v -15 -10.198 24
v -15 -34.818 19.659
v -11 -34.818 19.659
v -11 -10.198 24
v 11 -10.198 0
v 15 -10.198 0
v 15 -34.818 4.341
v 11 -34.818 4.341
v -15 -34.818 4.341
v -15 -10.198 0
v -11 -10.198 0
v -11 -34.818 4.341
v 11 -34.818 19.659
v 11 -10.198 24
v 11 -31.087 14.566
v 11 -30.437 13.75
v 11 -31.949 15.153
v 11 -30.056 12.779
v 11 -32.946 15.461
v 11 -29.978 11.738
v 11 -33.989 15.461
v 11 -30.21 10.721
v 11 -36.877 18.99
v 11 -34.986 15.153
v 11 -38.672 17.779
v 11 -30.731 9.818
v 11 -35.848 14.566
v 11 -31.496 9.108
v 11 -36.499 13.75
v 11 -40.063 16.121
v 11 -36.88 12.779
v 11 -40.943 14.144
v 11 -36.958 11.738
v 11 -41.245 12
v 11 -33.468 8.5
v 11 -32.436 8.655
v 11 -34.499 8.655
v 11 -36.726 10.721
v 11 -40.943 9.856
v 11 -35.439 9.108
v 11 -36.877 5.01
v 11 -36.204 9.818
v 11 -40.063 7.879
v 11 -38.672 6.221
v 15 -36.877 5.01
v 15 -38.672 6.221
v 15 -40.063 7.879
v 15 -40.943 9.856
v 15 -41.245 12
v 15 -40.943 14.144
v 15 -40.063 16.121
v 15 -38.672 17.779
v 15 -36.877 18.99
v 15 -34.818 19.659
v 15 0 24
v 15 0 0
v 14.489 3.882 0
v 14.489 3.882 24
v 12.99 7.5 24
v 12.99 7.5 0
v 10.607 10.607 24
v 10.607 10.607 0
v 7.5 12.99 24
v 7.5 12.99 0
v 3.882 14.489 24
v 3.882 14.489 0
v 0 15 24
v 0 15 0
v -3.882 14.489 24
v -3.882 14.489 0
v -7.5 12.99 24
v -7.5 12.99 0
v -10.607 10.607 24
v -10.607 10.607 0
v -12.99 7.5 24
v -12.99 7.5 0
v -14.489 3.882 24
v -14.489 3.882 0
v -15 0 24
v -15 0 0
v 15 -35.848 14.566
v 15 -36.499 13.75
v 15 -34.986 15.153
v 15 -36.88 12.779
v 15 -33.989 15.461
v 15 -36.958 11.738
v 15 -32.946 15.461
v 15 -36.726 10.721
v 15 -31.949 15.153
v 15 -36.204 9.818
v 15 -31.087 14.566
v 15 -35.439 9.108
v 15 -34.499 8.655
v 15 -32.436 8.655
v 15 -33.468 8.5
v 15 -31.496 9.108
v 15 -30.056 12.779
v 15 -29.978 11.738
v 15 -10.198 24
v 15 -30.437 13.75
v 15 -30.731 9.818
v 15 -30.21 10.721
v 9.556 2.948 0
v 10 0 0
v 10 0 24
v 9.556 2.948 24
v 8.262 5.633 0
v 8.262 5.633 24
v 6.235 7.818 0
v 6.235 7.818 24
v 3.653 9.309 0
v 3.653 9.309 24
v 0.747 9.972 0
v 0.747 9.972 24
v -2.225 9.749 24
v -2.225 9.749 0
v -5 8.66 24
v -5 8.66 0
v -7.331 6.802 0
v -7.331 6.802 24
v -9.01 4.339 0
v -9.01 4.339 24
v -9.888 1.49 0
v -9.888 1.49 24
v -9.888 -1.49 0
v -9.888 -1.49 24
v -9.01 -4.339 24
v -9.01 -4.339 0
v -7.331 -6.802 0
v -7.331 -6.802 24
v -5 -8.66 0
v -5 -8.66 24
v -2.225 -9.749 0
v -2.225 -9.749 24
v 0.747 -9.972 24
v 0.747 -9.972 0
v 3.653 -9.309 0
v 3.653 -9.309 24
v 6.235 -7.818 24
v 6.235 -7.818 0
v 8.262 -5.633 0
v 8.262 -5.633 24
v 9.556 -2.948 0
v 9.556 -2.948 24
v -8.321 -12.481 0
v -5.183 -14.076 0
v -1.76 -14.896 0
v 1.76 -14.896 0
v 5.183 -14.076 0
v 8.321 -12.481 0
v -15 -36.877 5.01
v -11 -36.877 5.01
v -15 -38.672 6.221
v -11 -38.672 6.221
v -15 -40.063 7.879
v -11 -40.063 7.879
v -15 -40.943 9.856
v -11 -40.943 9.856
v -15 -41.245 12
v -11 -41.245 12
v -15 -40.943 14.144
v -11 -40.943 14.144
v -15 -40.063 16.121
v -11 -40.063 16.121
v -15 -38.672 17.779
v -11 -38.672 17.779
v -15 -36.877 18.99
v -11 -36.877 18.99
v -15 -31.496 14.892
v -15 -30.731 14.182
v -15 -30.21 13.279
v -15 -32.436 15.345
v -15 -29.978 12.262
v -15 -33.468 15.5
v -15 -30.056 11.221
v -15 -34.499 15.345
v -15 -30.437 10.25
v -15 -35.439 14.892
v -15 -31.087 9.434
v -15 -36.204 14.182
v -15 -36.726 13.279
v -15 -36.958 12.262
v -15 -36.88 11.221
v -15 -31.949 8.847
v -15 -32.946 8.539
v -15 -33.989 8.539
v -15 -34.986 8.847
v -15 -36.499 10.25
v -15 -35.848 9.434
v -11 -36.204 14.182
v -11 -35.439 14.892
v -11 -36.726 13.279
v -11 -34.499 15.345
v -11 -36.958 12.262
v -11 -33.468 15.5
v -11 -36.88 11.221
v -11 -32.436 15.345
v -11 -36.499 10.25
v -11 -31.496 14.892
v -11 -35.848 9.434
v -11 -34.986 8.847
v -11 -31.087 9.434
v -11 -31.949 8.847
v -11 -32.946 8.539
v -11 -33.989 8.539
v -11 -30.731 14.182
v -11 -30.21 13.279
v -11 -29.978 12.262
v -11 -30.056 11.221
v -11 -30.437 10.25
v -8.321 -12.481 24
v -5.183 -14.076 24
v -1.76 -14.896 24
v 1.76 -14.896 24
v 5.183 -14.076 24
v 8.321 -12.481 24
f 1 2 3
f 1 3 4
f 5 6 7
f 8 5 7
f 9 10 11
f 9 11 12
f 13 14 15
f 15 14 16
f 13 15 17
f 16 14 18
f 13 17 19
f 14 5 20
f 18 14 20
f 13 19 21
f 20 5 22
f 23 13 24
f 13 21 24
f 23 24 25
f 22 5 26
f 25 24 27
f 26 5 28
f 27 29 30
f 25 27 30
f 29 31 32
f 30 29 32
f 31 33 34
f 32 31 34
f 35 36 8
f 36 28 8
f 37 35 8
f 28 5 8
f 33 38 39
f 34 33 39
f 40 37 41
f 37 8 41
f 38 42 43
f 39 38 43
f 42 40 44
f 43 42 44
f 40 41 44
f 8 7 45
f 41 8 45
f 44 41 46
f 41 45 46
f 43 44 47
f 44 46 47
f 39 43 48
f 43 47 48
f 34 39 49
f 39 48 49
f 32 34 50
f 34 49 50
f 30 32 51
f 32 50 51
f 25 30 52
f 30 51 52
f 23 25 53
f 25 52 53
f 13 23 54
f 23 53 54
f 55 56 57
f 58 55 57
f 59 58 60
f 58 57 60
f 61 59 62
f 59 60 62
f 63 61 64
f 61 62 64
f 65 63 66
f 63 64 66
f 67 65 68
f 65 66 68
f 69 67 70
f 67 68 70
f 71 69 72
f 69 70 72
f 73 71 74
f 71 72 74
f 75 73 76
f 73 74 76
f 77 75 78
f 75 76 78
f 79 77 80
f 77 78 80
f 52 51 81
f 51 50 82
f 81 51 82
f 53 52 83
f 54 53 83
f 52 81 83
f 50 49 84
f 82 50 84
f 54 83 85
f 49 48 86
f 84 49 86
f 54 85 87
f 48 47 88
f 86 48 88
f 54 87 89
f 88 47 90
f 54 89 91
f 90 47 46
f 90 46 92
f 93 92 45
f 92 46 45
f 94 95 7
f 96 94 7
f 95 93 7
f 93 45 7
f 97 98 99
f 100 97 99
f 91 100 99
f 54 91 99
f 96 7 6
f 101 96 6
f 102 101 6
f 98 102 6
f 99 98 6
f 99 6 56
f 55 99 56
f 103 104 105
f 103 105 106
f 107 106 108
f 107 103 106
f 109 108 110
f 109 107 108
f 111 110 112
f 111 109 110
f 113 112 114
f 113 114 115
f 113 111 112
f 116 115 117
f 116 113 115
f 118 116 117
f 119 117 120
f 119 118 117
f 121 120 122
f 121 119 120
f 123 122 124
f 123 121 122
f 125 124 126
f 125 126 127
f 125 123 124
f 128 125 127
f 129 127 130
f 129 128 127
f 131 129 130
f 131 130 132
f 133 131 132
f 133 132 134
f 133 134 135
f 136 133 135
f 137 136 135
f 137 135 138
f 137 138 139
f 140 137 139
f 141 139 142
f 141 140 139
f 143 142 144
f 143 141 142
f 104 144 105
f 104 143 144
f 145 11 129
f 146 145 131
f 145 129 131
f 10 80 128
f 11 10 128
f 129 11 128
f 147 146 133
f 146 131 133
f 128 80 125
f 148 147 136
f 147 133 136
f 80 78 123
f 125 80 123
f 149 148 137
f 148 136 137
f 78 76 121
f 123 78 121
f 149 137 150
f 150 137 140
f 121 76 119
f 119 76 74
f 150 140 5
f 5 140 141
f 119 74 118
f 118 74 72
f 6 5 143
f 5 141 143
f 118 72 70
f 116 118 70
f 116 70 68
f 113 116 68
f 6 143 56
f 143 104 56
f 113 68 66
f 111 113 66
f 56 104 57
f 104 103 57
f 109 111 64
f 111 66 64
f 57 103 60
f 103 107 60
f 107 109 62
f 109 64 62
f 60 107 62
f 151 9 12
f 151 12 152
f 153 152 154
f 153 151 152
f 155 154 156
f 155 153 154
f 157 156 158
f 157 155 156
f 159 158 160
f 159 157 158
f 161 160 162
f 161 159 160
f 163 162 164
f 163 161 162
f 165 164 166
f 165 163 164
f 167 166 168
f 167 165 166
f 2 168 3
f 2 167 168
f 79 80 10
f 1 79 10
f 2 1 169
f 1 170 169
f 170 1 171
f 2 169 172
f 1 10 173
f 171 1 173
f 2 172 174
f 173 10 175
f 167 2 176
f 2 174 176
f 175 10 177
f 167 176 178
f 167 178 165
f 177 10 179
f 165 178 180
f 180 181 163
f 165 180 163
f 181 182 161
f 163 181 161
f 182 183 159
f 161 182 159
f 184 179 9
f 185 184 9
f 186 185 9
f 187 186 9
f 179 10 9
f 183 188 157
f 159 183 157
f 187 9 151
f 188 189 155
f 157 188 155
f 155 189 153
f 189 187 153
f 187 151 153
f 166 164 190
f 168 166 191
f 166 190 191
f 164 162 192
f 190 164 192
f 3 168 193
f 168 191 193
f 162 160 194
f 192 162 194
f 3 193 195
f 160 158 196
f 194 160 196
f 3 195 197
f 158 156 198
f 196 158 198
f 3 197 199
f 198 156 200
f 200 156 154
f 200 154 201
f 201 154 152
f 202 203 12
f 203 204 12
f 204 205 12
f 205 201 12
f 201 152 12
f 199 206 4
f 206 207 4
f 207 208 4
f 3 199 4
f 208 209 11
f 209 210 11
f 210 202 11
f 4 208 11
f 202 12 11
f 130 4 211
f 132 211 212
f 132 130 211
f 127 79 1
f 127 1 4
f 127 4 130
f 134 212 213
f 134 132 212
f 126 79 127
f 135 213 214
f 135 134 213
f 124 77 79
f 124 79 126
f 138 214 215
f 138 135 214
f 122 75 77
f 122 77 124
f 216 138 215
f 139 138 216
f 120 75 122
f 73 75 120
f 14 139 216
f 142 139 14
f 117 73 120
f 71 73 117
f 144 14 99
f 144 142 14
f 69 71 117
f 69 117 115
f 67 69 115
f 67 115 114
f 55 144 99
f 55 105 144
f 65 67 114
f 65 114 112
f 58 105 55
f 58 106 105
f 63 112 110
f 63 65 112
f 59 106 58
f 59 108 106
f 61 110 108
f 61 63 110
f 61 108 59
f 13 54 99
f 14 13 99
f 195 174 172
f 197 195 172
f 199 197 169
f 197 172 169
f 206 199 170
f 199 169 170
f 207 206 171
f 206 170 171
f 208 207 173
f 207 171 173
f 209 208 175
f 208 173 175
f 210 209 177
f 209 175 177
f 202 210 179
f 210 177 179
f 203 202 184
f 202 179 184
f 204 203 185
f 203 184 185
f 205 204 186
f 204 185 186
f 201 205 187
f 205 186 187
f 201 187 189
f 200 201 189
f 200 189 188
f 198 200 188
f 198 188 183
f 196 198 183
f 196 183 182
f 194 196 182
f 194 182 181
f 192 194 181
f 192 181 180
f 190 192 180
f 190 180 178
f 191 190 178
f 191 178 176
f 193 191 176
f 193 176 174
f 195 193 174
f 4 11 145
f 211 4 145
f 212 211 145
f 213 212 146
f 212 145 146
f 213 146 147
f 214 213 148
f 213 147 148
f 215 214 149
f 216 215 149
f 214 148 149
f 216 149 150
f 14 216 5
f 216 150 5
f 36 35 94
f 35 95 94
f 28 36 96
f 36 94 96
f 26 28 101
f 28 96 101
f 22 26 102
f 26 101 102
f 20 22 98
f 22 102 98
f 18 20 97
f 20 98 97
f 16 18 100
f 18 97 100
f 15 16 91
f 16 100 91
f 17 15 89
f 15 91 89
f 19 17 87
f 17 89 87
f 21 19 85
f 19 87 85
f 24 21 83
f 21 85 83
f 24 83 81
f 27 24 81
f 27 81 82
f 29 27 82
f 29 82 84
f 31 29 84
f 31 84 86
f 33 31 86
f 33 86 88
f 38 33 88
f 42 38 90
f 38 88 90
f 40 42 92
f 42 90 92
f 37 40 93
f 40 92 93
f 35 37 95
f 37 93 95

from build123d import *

# Parameters (mm, degrees)
SKETCH2_R           = 10
BOSS_EXTRUDE1_DEPTH = 24
CUT_EXTRUDE1_REACH  = 32
SKETCH3_R           = 3.5
CUT_EXTRUDE2_REACH  = 32
SKETCH4_R           = 3.5


with BuildPart() as part:
    # Sketch2 → Boss-Extrude1 (new body)
    with BuildSketch(Plane.XY):
        with BuildLine():
            Line((-15, 0), (-15, -15))
            Line((-15, -15), (-15, -42))
            Line((-15, -42), (-11, -42))
            Line((-11, -42), (-11, -10.198039027))
            ThreePointArc((-11, -10.198039027), (0, -15), (11, -10.198039027))
            Line((11, -10.198039027), (11, -42))
            Line((11, -42), (15, -42))
            Line((15, -42), (15, -22))
            Line((15, -22), (15, 0))
            ThreePointArc((15, 0), (0, 15), (-15, 0))
        make_face()
        Circle(SKETCH2_R, mode=Mode.SUBTRACT)
    extrude(amount=BOSS_EXTRUDE1_DEPTH)

    # Sketch3 → Cut-Extrude1 (cut, up to next)
    with BuildSketch(Plane.ZY.offset(15), mode=Mode.PRIVATE) as cut_extrude1_sk1:
        with Locations((12, -33.467780556)):
            Circle(SKETCH3_R)
    cut_extrude1_tool1 = extrude(cut_extrude1_sk1.sketch, amount=-CUT_EXTRUDE1_REACH, mode=Mode.PRIVATE) & part.part
    add(cut_extrude1_tool1.solids().sort_by_distance((-15, -33.467781, 12))[0], mode=Mode.SUBTRACT)
    # Sketch3 → Cut-Extrude1 (cut, up to next)
    with BuildSketch(Plane.ZY.offset(15), mode=Mode.PRIVATE) as cut_extrude1_sk2:
        with BuildLine():
            Line((0, -10.198039027), (4.341204442, -34.818232852))
            ThreePointArc((4.341204442, -34.818232852), (12, -41.244725381), (19.658795558, -34.818232852))
            Line((19.658795558, -34.818232852), (24, -10.198039027))
            Line((24, -10.198039027), (24, -42))
            Line((24, -42), (0, -42))
            Line((0, -42), (0, -10.198039027))
        make_face()
    cut_extrude1_tool2 = extrude(cut_extrude1_sk2.sketch, amount=-CUT_EXTRUDE1_REACH, mode=Mode.PRIVATE) & part.part
    add(cut_extrude1_tool2.solids().sort_by_distance((-15, -22.57732, 1.778238))[0], mode=Mode.SUBTRACT)

    # Sketch4 → Cut-Extrude2 (cut, up to next)
    with BuildSketch(Plane(origin=(15, 0, 0), x_dir=(0, 0, -1), z_dir=(1, 0, 0)), mode=Mode.PRIVATE) as cut_extrude2_sk1:
        with Locations((-12, -33.467780556)):
            Circle(SKETCH4_R)
    cut_extrude2_tool1 = extrude(cut_extrude2_sk1.sketch, amount=-CUT_EXTRUDE2_REACH, mode=Mode.PRIVATE) & part.part
    add(cut_extrude2_tool1.solids().sort_by_distance((15, -33.467781, 12))[0], mode=Mode.SUBTRACT)
    # Sketch4 → Cut-Extrude2 (cut, up to next)
    with BuildSketch(Plane(origin=(15, 0, 0), x_dir=(0, 0, -1), z_dir=(1, 0, 0)), mode=Mode.PRIVATE) as cut_extrude2_sk2:
        with BuildLine():
            Line((0, -10.198039027), (-4.341204442, -34.818232852))
            ThreePointArc((-4.341204442, -34.818232852), (-12, -41.244725381), (-19.658795558, -34.818232852))
            Line((-19.658795558, -34.818232852), (-24, -10.198039027))
            Line((-24, -10.198039027), (-24, -42))
            Line((-24, -42), (0, -42))
            Line((0, -42), (0, -10.198039027))
        make_face()
    cut_extrude2_tool2 = extrude(cut_extrude2_sk2.sketch, amount=-CUT_EXTRUDE2_REACH, mode=Mode.PRIVATE) & part.part
    add(cut_extrude2_tool2.solids().sort_by_distance((15, -22.57732, 1.778238))[0], mode=Mode.SUBTRACT)


solid = part.part
